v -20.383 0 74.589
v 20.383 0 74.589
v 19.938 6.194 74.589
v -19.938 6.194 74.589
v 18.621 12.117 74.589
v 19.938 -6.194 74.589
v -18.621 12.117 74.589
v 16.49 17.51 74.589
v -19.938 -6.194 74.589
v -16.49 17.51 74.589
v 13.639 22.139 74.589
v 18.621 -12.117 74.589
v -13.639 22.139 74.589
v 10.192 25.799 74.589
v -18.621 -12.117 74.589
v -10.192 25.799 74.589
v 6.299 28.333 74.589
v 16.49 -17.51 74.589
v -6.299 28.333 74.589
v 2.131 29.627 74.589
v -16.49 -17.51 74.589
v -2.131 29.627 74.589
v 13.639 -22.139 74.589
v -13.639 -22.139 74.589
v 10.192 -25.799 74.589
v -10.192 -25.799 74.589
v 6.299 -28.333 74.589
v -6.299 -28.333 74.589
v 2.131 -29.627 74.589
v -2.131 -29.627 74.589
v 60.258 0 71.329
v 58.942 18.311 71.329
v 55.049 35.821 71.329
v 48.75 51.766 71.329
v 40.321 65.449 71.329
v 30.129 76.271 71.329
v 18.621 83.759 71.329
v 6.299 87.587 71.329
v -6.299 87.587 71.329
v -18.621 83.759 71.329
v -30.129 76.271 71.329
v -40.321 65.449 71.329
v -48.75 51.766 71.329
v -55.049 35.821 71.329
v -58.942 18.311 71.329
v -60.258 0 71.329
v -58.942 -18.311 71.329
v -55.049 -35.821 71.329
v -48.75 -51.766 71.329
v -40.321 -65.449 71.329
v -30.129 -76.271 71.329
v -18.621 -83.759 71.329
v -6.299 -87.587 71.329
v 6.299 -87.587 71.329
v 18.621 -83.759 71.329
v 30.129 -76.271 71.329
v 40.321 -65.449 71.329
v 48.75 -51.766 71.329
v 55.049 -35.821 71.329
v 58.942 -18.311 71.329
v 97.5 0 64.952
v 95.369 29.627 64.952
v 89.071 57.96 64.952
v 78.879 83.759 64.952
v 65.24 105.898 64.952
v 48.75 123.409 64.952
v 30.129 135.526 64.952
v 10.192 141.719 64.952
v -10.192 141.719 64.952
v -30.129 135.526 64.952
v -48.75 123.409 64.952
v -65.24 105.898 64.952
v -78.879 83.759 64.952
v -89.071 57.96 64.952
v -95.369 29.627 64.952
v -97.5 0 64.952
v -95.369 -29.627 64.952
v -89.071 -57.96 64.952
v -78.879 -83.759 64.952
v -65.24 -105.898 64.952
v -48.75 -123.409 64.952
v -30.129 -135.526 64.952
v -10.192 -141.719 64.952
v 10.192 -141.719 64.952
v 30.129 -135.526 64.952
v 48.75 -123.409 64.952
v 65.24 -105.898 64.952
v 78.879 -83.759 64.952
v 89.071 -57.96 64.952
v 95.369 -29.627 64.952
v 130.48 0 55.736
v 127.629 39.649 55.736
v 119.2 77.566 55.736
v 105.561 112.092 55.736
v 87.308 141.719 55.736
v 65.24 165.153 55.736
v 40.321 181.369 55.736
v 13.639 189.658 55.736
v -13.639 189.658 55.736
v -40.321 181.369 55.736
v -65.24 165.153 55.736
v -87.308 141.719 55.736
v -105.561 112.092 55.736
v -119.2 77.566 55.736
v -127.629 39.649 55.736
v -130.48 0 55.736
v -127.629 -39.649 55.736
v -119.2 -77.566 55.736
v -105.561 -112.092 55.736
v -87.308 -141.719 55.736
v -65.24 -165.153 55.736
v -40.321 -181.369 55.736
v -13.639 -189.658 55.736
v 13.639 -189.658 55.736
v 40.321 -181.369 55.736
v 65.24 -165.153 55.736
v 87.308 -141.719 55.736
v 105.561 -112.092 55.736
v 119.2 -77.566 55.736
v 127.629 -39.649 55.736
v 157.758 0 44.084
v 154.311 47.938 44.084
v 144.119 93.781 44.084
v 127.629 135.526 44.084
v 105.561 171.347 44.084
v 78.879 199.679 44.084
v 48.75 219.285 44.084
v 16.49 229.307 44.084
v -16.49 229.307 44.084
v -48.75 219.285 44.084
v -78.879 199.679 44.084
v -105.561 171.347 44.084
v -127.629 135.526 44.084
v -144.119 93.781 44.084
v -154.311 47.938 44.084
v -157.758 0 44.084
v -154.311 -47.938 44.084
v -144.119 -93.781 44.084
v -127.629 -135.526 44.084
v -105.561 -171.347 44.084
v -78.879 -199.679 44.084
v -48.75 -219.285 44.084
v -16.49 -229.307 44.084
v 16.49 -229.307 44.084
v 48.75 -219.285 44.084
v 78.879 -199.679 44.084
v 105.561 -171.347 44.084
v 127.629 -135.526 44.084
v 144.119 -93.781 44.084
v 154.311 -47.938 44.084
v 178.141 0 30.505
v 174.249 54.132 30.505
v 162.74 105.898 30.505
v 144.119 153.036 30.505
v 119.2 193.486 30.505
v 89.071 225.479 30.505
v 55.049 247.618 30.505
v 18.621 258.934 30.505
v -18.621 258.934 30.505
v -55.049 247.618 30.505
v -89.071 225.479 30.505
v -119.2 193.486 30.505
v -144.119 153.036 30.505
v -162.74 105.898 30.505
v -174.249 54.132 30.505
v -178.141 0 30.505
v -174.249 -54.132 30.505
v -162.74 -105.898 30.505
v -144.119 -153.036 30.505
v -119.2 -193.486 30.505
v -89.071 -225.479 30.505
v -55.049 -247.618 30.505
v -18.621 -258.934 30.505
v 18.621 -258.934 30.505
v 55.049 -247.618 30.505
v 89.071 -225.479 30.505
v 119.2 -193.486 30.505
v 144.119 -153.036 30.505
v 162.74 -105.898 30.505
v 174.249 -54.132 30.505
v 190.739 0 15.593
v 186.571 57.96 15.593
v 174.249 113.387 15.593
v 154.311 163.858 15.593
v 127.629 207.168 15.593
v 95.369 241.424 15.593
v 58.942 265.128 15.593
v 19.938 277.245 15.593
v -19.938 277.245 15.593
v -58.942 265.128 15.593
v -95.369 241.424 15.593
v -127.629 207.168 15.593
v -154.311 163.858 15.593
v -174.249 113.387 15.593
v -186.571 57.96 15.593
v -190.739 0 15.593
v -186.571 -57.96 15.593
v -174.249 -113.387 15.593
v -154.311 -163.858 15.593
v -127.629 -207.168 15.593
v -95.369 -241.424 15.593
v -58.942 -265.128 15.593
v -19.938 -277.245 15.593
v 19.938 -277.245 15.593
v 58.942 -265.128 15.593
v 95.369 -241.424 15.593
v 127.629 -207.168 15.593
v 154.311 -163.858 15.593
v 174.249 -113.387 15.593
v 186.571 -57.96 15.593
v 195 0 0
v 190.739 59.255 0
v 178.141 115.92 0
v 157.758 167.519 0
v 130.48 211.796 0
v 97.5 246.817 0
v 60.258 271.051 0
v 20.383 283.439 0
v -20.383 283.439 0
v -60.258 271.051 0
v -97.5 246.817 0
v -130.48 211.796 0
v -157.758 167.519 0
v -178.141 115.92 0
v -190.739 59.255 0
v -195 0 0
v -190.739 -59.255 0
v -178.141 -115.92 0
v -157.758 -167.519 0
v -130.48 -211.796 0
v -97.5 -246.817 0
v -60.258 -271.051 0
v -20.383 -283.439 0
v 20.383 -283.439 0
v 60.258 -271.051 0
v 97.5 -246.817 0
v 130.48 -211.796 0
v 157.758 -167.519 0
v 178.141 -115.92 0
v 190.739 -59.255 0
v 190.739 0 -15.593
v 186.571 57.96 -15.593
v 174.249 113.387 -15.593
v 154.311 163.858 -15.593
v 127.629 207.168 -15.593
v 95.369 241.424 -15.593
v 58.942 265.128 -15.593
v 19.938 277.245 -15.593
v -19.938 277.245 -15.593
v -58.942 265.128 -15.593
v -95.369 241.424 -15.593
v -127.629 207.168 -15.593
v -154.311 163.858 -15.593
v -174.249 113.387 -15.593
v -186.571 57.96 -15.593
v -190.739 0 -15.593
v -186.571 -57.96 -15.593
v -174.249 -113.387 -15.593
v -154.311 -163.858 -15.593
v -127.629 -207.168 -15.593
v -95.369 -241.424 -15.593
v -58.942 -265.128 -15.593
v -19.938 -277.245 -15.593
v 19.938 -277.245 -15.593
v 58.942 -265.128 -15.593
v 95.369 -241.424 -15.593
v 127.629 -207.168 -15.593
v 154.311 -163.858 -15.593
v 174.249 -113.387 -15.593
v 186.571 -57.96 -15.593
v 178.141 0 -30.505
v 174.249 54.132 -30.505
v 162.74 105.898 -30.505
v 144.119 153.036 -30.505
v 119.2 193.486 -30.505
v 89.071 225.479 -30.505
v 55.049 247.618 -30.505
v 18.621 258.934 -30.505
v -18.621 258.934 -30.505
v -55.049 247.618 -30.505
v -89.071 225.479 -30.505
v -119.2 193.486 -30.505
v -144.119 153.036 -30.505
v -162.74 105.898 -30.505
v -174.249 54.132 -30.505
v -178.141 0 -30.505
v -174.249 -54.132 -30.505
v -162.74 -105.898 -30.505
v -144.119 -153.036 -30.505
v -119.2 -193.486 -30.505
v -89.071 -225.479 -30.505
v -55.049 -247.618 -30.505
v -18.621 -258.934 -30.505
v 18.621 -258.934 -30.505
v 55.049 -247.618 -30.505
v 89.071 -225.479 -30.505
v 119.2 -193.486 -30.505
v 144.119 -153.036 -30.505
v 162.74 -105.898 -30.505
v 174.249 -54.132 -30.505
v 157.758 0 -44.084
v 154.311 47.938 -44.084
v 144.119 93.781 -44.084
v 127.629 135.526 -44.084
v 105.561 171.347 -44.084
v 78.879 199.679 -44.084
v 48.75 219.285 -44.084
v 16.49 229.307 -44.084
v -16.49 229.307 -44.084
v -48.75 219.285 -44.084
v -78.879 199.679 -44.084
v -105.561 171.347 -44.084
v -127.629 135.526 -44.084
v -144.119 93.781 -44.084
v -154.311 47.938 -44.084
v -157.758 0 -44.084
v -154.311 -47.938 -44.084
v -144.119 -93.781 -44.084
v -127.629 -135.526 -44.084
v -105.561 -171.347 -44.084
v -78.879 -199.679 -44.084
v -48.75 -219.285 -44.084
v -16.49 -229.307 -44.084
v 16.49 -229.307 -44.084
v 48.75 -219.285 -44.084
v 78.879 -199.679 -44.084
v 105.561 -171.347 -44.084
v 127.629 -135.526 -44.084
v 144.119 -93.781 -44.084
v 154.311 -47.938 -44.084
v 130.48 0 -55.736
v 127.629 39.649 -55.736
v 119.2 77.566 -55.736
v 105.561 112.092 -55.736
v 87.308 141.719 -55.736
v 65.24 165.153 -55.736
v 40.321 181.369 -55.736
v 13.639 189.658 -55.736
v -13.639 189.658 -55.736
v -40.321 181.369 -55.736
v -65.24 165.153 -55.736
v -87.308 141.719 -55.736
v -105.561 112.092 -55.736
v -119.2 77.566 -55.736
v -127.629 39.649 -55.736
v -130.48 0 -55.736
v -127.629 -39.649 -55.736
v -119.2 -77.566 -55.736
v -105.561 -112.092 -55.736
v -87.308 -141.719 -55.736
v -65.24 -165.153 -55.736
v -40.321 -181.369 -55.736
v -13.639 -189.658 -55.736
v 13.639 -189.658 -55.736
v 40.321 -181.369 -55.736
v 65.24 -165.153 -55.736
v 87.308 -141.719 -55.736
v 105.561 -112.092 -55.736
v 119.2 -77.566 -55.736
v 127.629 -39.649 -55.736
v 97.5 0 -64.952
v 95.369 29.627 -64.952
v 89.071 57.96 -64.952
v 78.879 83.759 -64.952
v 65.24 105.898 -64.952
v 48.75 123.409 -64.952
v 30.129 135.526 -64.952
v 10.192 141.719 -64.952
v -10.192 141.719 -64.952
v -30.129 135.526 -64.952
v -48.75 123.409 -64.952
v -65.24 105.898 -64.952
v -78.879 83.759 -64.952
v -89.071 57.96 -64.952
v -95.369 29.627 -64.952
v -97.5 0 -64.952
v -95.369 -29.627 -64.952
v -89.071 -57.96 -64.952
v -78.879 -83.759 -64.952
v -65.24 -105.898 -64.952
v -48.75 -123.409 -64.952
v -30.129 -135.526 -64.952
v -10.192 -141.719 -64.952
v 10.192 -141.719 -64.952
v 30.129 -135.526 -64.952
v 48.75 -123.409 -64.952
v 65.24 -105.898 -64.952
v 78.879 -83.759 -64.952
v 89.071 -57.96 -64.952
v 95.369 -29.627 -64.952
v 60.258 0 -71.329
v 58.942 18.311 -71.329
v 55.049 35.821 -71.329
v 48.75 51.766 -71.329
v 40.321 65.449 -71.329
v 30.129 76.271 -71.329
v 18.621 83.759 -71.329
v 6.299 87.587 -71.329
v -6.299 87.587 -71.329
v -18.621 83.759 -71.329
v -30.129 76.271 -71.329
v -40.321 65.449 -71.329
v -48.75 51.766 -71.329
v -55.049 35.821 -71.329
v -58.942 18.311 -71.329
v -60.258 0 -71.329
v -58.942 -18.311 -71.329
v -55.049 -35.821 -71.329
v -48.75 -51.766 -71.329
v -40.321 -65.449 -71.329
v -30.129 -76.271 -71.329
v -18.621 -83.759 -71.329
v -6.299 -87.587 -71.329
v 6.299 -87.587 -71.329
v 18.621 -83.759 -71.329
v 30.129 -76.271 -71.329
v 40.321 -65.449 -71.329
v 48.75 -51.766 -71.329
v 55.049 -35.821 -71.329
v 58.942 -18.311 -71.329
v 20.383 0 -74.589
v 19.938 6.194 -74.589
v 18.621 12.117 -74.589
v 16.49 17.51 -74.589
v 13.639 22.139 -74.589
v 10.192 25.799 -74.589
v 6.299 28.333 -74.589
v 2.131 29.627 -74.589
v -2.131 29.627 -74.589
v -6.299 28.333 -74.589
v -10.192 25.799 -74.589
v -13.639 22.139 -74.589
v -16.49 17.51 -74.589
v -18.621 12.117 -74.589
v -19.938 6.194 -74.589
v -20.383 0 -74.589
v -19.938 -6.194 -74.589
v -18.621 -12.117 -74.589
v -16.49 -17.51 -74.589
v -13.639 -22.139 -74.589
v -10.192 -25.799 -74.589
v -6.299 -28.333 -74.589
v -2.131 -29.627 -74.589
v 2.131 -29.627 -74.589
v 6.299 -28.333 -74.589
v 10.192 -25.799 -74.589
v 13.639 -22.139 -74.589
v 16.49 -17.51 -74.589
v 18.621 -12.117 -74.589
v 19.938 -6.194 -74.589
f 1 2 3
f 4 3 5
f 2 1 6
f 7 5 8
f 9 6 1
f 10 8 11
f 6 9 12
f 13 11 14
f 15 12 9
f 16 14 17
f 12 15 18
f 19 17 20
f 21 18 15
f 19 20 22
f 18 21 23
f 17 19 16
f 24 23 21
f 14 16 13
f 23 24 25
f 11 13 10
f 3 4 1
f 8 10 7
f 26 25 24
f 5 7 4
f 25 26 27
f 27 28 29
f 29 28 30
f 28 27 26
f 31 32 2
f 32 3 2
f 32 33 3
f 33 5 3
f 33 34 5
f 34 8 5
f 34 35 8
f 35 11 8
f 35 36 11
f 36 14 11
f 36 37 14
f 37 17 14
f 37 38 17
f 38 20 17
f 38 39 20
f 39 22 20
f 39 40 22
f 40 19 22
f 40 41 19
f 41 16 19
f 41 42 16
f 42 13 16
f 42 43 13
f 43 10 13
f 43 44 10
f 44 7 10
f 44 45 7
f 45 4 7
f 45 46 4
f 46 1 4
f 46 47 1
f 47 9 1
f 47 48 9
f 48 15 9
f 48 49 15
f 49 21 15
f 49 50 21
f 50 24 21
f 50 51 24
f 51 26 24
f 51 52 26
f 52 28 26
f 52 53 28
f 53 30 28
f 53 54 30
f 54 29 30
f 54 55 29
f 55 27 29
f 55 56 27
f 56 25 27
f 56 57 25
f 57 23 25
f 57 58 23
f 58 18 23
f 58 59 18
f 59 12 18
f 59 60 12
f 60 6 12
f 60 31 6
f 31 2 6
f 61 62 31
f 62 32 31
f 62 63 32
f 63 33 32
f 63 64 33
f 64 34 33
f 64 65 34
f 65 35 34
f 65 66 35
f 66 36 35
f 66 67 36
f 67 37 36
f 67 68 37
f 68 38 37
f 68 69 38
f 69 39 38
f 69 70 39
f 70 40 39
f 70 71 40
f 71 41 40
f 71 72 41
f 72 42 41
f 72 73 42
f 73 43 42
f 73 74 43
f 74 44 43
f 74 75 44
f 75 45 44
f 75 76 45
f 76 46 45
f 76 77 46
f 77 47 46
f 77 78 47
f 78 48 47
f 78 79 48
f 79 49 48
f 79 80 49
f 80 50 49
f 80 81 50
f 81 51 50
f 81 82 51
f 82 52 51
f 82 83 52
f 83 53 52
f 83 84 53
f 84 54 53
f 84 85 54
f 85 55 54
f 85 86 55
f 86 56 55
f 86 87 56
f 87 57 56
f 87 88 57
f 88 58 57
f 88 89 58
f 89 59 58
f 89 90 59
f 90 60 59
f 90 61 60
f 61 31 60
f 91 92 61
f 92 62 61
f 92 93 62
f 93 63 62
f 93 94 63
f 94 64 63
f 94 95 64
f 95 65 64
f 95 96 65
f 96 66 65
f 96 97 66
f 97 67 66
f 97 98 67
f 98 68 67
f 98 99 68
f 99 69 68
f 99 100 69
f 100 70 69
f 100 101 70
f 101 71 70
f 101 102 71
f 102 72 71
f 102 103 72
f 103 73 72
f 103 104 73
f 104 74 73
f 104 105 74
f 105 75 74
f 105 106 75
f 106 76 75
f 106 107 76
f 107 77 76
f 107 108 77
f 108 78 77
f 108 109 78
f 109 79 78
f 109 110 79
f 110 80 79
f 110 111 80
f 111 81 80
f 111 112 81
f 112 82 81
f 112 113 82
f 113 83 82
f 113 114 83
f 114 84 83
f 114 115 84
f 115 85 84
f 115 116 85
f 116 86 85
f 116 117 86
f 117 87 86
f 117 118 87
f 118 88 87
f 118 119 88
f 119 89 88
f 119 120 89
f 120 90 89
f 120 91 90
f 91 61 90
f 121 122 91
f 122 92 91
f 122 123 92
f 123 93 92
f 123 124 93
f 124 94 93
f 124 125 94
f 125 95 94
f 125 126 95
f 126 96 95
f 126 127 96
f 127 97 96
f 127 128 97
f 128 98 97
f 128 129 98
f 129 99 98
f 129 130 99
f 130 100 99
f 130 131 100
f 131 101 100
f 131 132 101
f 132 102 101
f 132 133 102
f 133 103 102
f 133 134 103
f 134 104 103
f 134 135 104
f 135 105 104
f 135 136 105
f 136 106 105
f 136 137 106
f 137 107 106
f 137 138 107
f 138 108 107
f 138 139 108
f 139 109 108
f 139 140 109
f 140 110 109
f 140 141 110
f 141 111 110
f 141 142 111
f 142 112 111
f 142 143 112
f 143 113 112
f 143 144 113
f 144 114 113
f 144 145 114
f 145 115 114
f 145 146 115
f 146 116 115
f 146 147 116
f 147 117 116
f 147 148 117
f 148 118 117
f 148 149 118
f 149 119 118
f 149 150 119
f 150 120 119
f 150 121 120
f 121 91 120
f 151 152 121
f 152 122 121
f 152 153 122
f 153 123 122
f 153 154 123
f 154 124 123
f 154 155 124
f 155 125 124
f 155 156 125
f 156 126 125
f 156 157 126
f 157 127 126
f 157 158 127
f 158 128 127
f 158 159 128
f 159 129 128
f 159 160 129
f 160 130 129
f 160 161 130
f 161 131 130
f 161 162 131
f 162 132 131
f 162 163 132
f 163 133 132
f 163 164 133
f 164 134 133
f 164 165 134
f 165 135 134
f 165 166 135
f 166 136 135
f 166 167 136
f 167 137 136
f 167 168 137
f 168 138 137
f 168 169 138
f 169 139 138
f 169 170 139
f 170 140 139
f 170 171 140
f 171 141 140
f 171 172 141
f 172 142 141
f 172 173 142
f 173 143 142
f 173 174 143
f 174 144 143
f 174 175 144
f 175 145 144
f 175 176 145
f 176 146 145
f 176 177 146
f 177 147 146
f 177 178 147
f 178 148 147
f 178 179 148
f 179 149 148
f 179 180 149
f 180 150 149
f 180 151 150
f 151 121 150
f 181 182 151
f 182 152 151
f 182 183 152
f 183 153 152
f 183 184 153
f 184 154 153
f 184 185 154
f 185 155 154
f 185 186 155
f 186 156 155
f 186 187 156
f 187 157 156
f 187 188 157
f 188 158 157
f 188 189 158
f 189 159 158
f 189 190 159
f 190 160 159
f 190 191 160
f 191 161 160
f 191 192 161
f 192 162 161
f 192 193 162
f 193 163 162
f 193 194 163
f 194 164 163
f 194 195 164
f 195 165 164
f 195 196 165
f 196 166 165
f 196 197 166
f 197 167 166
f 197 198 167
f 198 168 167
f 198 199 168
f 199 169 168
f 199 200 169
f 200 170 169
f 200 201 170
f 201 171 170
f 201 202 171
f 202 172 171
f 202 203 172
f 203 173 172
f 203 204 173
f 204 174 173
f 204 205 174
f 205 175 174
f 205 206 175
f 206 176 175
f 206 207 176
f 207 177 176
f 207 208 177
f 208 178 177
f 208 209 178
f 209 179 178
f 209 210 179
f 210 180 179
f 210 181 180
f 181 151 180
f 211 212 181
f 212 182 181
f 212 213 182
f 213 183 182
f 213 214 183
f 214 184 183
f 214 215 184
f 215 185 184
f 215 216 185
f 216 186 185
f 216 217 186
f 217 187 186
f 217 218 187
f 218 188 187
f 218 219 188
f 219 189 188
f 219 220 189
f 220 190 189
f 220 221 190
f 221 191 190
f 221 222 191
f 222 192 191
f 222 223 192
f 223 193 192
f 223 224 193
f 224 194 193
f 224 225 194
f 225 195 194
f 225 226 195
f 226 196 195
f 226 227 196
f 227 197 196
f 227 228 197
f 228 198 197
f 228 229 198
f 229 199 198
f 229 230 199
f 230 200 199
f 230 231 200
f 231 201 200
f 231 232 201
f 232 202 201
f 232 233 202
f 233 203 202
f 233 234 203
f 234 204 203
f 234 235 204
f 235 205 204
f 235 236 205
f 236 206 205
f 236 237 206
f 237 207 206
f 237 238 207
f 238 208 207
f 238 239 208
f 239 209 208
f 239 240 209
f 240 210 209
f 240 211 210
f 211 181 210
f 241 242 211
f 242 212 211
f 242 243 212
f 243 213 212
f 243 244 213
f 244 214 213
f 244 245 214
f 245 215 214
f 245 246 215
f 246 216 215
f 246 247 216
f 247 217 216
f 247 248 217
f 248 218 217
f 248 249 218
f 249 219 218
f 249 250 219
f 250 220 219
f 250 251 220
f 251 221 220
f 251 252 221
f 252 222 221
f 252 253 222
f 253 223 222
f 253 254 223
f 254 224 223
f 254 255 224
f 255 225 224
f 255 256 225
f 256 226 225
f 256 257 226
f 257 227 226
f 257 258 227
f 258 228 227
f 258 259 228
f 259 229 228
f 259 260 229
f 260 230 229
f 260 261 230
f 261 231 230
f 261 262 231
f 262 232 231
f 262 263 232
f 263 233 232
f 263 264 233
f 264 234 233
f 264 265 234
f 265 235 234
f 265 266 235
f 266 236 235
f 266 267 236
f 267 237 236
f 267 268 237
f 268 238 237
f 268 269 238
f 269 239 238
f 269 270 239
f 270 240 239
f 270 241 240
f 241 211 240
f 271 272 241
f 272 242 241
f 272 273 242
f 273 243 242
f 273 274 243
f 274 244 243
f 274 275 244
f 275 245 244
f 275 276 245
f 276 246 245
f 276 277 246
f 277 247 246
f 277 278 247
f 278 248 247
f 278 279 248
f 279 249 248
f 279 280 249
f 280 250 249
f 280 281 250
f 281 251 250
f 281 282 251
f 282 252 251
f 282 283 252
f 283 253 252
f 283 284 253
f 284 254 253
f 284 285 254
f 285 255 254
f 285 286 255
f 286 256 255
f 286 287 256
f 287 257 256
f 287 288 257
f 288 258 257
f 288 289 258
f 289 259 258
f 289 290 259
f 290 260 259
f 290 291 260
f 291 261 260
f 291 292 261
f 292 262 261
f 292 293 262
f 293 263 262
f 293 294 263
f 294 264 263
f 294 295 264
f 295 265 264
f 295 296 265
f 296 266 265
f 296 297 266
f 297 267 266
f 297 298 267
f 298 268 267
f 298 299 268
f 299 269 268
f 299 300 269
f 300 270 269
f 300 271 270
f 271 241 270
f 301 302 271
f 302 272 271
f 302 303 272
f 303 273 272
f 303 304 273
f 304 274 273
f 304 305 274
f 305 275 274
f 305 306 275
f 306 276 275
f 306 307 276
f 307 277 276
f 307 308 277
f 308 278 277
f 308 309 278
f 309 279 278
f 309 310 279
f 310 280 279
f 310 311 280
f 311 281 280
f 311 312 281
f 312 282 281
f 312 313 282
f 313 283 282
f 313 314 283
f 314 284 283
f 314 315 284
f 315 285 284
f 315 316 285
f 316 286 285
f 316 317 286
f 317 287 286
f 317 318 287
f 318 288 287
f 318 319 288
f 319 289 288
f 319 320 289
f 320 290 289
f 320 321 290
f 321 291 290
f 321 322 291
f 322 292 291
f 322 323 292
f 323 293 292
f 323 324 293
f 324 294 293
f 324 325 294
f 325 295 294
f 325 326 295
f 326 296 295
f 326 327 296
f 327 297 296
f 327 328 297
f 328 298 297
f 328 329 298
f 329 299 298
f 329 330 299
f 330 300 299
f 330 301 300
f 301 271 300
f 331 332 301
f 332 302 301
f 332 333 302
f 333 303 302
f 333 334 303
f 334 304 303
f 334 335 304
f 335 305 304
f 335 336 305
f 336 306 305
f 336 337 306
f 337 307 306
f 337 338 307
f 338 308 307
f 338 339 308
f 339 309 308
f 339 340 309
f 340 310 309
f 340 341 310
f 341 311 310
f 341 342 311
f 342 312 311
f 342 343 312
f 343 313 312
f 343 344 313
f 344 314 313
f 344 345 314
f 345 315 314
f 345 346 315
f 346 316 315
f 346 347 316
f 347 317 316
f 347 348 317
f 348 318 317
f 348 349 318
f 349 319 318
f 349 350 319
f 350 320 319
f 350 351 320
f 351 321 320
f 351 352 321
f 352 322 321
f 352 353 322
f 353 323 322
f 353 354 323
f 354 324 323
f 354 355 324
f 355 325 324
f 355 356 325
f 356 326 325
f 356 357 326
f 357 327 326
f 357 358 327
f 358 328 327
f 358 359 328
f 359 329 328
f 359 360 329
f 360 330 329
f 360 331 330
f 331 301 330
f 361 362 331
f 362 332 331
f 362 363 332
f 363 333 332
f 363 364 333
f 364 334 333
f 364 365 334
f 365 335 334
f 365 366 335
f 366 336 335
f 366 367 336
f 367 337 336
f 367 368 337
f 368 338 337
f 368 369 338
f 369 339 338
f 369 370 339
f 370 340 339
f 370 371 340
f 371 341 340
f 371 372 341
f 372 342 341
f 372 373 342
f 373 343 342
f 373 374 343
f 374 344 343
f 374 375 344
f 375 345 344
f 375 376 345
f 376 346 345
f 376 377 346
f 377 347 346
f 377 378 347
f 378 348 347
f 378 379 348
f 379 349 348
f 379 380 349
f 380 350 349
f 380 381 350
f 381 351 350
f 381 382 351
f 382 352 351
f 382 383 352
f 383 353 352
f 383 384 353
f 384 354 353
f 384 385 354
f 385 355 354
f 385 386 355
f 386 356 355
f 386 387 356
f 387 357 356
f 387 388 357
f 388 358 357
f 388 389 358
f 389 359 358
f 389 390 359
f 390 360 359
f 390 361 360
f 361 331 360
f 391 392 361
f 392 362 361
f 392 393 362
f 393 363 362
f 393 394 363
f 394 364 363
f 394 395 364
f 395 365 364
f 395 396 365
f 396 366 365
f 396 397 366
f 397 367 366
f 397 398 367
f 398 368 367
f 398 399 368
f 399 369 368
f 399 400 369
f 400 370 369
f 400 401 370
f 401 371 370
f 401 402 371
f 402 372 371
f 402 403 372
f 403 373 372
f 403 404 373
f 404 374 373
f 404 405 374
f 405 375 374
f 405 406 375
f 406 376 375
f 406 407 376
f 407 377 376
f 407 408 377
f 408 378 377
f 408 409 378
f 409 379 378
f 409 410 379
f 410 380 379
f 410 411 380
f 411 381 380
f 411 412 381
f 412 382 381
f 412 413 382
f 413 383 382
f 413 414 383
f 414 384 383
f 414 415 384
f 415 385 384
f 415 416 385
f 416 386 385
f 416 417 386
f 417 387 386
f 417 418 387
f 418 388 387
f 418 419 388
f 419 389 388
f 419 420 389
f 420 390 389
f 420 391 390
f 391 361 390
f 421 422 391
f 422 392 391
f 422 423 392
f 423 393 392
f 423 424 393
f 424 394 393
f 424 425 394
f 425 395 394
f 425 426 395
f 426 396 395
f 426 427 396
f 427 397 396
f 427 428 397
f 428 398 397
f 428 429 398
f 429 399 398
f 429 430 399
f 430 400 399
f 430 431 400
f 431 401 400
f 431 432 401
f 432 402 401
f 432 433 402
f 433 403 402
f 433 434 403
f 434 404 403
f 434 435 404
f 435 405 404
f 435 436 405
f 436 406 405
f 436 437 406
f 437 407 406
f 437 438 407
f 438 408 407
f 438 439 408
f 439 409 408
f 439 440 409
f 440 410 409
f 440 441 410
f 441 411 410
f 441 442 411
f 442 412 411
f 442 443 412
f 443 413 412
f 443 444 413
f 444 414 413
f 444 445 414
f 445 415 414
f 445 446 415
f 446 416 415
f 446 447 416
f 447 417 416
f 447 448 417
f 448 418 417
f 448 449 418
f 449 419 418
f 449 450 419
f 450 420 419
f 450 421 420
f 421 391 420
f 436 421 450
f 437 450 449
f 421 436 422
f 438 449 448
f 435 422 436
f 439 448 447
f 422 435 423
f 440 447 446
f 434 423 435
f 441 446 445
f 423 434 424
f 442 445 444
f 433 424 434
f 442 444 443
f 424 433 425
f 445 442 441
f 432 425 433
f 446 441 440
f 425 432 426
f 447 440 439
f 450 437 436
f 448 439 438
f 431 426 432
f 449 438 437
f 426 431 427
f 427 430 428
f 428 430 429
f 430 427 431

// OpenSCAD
// Generated by SolidPython 1.0.1 on 2020-07-29 00:46:51


scale(v = [13, 19, 5]) {
	sphere(r = 15);
}
/***********************************************
*********      SolidPython code:      **********
************************************************
 
# import packages: SolidPython
from solid import *
from solid.utils import *
from itertools import chain, combinations, permutations


class Resize:

    def __init__(self, scad_file):
        self.scad_file = scad_file
        #self.scad_file = import_scad(scad_file)
        # cone/cylinder param:
        self.r1 = 0
        self.r2 = 0
        self.h = 0
        # rectangular prism param:
        self.w = 0
        self.l = 0
        # ellipse param:
        self.r = 0

    # import OpenScad code (file name corresponds to shape)


    # classify shape + parameters
    def assign(self, param1, param2, param3):
        if self.scad_file == 'cone.scad':
            self.r1 = param1
            self.r2 = param2
            self.h = param3
        elif self.scad_file == 'cylinder.scad':
            self.r1 = param1
            self.r2 = param2
            self.h = param3
        elif self.scad_file == 'rectangularPrism.scad':
            self.h = param1
            self.l = param2
            self.w = param3
        else:
            self.r = param1
            self.h = param2

    # resize parameters
    def iterate(self):
        x = range(3, 20, 2)
        i = 1
        if self.scad_file == 'cone.scad':
            tempList = list(permutations(x, 2))
            for temp in tempList:
                param1 = temp[0]
                param2 = temp[1]
                filepath = 'produced_scad_files/' + 'cone' + str(param1) + '_' + str(param2) + '_' + '.scad'
                scad_render_to_file(cylinder(h=param1, r1=param2, r2=0), filepath)

        elif self.scad_file == 'cylinder.scad':
            tempList = list(permutations(x, 3))
            for temp in tempList:
                param1 = temp[0]
                param2 = temp[1]
                filepath = 'produced_scad_files/' + 'cylinder' + str(param1) + '_' + str(param2) + '_' + '.scad'
                scad_render_to_file(cylinder(h=param1, r1=param2, r2=param2), filepath)

        elif self.scad_file == 'rectangularPrism.scad':
            tempList = list(permutations(x, 3))
            for temp in tempList:
                param1 = temp[0]
                param2 = temp[1]
                param3 = temp[2]
                filepath = 'produced_scad_files/' + 'rectangularPrism' + str(param1) + '_' + str(param2) + '_' + str(
                    param3) + '.scad'
                scad_render_to_file(cube(size=(param1, param2, param3)), filepath)

        elif self.scad_file == 'ellipse.scad':
            tempList = list(permutations(x, 4))
            for temp in tempList:
                param1 = temp[0]
                param2 = temp[1]
                param3 = temp[2]
                param4 = temp[3]
                filepath = 'produced_scad_files/' + 'ellipse' + str(param1) + '_' + str(param2) + '_' + str(param3) + '_' + str(param4) + '.scad'
                scad_render_to_file(scale([param1, param2, param3])(sphere(r=param4)), filepath)

    def render_to_scadfile(self):
        scad_render_to_file(scad, 'example.scad') 
 
************************************************/
